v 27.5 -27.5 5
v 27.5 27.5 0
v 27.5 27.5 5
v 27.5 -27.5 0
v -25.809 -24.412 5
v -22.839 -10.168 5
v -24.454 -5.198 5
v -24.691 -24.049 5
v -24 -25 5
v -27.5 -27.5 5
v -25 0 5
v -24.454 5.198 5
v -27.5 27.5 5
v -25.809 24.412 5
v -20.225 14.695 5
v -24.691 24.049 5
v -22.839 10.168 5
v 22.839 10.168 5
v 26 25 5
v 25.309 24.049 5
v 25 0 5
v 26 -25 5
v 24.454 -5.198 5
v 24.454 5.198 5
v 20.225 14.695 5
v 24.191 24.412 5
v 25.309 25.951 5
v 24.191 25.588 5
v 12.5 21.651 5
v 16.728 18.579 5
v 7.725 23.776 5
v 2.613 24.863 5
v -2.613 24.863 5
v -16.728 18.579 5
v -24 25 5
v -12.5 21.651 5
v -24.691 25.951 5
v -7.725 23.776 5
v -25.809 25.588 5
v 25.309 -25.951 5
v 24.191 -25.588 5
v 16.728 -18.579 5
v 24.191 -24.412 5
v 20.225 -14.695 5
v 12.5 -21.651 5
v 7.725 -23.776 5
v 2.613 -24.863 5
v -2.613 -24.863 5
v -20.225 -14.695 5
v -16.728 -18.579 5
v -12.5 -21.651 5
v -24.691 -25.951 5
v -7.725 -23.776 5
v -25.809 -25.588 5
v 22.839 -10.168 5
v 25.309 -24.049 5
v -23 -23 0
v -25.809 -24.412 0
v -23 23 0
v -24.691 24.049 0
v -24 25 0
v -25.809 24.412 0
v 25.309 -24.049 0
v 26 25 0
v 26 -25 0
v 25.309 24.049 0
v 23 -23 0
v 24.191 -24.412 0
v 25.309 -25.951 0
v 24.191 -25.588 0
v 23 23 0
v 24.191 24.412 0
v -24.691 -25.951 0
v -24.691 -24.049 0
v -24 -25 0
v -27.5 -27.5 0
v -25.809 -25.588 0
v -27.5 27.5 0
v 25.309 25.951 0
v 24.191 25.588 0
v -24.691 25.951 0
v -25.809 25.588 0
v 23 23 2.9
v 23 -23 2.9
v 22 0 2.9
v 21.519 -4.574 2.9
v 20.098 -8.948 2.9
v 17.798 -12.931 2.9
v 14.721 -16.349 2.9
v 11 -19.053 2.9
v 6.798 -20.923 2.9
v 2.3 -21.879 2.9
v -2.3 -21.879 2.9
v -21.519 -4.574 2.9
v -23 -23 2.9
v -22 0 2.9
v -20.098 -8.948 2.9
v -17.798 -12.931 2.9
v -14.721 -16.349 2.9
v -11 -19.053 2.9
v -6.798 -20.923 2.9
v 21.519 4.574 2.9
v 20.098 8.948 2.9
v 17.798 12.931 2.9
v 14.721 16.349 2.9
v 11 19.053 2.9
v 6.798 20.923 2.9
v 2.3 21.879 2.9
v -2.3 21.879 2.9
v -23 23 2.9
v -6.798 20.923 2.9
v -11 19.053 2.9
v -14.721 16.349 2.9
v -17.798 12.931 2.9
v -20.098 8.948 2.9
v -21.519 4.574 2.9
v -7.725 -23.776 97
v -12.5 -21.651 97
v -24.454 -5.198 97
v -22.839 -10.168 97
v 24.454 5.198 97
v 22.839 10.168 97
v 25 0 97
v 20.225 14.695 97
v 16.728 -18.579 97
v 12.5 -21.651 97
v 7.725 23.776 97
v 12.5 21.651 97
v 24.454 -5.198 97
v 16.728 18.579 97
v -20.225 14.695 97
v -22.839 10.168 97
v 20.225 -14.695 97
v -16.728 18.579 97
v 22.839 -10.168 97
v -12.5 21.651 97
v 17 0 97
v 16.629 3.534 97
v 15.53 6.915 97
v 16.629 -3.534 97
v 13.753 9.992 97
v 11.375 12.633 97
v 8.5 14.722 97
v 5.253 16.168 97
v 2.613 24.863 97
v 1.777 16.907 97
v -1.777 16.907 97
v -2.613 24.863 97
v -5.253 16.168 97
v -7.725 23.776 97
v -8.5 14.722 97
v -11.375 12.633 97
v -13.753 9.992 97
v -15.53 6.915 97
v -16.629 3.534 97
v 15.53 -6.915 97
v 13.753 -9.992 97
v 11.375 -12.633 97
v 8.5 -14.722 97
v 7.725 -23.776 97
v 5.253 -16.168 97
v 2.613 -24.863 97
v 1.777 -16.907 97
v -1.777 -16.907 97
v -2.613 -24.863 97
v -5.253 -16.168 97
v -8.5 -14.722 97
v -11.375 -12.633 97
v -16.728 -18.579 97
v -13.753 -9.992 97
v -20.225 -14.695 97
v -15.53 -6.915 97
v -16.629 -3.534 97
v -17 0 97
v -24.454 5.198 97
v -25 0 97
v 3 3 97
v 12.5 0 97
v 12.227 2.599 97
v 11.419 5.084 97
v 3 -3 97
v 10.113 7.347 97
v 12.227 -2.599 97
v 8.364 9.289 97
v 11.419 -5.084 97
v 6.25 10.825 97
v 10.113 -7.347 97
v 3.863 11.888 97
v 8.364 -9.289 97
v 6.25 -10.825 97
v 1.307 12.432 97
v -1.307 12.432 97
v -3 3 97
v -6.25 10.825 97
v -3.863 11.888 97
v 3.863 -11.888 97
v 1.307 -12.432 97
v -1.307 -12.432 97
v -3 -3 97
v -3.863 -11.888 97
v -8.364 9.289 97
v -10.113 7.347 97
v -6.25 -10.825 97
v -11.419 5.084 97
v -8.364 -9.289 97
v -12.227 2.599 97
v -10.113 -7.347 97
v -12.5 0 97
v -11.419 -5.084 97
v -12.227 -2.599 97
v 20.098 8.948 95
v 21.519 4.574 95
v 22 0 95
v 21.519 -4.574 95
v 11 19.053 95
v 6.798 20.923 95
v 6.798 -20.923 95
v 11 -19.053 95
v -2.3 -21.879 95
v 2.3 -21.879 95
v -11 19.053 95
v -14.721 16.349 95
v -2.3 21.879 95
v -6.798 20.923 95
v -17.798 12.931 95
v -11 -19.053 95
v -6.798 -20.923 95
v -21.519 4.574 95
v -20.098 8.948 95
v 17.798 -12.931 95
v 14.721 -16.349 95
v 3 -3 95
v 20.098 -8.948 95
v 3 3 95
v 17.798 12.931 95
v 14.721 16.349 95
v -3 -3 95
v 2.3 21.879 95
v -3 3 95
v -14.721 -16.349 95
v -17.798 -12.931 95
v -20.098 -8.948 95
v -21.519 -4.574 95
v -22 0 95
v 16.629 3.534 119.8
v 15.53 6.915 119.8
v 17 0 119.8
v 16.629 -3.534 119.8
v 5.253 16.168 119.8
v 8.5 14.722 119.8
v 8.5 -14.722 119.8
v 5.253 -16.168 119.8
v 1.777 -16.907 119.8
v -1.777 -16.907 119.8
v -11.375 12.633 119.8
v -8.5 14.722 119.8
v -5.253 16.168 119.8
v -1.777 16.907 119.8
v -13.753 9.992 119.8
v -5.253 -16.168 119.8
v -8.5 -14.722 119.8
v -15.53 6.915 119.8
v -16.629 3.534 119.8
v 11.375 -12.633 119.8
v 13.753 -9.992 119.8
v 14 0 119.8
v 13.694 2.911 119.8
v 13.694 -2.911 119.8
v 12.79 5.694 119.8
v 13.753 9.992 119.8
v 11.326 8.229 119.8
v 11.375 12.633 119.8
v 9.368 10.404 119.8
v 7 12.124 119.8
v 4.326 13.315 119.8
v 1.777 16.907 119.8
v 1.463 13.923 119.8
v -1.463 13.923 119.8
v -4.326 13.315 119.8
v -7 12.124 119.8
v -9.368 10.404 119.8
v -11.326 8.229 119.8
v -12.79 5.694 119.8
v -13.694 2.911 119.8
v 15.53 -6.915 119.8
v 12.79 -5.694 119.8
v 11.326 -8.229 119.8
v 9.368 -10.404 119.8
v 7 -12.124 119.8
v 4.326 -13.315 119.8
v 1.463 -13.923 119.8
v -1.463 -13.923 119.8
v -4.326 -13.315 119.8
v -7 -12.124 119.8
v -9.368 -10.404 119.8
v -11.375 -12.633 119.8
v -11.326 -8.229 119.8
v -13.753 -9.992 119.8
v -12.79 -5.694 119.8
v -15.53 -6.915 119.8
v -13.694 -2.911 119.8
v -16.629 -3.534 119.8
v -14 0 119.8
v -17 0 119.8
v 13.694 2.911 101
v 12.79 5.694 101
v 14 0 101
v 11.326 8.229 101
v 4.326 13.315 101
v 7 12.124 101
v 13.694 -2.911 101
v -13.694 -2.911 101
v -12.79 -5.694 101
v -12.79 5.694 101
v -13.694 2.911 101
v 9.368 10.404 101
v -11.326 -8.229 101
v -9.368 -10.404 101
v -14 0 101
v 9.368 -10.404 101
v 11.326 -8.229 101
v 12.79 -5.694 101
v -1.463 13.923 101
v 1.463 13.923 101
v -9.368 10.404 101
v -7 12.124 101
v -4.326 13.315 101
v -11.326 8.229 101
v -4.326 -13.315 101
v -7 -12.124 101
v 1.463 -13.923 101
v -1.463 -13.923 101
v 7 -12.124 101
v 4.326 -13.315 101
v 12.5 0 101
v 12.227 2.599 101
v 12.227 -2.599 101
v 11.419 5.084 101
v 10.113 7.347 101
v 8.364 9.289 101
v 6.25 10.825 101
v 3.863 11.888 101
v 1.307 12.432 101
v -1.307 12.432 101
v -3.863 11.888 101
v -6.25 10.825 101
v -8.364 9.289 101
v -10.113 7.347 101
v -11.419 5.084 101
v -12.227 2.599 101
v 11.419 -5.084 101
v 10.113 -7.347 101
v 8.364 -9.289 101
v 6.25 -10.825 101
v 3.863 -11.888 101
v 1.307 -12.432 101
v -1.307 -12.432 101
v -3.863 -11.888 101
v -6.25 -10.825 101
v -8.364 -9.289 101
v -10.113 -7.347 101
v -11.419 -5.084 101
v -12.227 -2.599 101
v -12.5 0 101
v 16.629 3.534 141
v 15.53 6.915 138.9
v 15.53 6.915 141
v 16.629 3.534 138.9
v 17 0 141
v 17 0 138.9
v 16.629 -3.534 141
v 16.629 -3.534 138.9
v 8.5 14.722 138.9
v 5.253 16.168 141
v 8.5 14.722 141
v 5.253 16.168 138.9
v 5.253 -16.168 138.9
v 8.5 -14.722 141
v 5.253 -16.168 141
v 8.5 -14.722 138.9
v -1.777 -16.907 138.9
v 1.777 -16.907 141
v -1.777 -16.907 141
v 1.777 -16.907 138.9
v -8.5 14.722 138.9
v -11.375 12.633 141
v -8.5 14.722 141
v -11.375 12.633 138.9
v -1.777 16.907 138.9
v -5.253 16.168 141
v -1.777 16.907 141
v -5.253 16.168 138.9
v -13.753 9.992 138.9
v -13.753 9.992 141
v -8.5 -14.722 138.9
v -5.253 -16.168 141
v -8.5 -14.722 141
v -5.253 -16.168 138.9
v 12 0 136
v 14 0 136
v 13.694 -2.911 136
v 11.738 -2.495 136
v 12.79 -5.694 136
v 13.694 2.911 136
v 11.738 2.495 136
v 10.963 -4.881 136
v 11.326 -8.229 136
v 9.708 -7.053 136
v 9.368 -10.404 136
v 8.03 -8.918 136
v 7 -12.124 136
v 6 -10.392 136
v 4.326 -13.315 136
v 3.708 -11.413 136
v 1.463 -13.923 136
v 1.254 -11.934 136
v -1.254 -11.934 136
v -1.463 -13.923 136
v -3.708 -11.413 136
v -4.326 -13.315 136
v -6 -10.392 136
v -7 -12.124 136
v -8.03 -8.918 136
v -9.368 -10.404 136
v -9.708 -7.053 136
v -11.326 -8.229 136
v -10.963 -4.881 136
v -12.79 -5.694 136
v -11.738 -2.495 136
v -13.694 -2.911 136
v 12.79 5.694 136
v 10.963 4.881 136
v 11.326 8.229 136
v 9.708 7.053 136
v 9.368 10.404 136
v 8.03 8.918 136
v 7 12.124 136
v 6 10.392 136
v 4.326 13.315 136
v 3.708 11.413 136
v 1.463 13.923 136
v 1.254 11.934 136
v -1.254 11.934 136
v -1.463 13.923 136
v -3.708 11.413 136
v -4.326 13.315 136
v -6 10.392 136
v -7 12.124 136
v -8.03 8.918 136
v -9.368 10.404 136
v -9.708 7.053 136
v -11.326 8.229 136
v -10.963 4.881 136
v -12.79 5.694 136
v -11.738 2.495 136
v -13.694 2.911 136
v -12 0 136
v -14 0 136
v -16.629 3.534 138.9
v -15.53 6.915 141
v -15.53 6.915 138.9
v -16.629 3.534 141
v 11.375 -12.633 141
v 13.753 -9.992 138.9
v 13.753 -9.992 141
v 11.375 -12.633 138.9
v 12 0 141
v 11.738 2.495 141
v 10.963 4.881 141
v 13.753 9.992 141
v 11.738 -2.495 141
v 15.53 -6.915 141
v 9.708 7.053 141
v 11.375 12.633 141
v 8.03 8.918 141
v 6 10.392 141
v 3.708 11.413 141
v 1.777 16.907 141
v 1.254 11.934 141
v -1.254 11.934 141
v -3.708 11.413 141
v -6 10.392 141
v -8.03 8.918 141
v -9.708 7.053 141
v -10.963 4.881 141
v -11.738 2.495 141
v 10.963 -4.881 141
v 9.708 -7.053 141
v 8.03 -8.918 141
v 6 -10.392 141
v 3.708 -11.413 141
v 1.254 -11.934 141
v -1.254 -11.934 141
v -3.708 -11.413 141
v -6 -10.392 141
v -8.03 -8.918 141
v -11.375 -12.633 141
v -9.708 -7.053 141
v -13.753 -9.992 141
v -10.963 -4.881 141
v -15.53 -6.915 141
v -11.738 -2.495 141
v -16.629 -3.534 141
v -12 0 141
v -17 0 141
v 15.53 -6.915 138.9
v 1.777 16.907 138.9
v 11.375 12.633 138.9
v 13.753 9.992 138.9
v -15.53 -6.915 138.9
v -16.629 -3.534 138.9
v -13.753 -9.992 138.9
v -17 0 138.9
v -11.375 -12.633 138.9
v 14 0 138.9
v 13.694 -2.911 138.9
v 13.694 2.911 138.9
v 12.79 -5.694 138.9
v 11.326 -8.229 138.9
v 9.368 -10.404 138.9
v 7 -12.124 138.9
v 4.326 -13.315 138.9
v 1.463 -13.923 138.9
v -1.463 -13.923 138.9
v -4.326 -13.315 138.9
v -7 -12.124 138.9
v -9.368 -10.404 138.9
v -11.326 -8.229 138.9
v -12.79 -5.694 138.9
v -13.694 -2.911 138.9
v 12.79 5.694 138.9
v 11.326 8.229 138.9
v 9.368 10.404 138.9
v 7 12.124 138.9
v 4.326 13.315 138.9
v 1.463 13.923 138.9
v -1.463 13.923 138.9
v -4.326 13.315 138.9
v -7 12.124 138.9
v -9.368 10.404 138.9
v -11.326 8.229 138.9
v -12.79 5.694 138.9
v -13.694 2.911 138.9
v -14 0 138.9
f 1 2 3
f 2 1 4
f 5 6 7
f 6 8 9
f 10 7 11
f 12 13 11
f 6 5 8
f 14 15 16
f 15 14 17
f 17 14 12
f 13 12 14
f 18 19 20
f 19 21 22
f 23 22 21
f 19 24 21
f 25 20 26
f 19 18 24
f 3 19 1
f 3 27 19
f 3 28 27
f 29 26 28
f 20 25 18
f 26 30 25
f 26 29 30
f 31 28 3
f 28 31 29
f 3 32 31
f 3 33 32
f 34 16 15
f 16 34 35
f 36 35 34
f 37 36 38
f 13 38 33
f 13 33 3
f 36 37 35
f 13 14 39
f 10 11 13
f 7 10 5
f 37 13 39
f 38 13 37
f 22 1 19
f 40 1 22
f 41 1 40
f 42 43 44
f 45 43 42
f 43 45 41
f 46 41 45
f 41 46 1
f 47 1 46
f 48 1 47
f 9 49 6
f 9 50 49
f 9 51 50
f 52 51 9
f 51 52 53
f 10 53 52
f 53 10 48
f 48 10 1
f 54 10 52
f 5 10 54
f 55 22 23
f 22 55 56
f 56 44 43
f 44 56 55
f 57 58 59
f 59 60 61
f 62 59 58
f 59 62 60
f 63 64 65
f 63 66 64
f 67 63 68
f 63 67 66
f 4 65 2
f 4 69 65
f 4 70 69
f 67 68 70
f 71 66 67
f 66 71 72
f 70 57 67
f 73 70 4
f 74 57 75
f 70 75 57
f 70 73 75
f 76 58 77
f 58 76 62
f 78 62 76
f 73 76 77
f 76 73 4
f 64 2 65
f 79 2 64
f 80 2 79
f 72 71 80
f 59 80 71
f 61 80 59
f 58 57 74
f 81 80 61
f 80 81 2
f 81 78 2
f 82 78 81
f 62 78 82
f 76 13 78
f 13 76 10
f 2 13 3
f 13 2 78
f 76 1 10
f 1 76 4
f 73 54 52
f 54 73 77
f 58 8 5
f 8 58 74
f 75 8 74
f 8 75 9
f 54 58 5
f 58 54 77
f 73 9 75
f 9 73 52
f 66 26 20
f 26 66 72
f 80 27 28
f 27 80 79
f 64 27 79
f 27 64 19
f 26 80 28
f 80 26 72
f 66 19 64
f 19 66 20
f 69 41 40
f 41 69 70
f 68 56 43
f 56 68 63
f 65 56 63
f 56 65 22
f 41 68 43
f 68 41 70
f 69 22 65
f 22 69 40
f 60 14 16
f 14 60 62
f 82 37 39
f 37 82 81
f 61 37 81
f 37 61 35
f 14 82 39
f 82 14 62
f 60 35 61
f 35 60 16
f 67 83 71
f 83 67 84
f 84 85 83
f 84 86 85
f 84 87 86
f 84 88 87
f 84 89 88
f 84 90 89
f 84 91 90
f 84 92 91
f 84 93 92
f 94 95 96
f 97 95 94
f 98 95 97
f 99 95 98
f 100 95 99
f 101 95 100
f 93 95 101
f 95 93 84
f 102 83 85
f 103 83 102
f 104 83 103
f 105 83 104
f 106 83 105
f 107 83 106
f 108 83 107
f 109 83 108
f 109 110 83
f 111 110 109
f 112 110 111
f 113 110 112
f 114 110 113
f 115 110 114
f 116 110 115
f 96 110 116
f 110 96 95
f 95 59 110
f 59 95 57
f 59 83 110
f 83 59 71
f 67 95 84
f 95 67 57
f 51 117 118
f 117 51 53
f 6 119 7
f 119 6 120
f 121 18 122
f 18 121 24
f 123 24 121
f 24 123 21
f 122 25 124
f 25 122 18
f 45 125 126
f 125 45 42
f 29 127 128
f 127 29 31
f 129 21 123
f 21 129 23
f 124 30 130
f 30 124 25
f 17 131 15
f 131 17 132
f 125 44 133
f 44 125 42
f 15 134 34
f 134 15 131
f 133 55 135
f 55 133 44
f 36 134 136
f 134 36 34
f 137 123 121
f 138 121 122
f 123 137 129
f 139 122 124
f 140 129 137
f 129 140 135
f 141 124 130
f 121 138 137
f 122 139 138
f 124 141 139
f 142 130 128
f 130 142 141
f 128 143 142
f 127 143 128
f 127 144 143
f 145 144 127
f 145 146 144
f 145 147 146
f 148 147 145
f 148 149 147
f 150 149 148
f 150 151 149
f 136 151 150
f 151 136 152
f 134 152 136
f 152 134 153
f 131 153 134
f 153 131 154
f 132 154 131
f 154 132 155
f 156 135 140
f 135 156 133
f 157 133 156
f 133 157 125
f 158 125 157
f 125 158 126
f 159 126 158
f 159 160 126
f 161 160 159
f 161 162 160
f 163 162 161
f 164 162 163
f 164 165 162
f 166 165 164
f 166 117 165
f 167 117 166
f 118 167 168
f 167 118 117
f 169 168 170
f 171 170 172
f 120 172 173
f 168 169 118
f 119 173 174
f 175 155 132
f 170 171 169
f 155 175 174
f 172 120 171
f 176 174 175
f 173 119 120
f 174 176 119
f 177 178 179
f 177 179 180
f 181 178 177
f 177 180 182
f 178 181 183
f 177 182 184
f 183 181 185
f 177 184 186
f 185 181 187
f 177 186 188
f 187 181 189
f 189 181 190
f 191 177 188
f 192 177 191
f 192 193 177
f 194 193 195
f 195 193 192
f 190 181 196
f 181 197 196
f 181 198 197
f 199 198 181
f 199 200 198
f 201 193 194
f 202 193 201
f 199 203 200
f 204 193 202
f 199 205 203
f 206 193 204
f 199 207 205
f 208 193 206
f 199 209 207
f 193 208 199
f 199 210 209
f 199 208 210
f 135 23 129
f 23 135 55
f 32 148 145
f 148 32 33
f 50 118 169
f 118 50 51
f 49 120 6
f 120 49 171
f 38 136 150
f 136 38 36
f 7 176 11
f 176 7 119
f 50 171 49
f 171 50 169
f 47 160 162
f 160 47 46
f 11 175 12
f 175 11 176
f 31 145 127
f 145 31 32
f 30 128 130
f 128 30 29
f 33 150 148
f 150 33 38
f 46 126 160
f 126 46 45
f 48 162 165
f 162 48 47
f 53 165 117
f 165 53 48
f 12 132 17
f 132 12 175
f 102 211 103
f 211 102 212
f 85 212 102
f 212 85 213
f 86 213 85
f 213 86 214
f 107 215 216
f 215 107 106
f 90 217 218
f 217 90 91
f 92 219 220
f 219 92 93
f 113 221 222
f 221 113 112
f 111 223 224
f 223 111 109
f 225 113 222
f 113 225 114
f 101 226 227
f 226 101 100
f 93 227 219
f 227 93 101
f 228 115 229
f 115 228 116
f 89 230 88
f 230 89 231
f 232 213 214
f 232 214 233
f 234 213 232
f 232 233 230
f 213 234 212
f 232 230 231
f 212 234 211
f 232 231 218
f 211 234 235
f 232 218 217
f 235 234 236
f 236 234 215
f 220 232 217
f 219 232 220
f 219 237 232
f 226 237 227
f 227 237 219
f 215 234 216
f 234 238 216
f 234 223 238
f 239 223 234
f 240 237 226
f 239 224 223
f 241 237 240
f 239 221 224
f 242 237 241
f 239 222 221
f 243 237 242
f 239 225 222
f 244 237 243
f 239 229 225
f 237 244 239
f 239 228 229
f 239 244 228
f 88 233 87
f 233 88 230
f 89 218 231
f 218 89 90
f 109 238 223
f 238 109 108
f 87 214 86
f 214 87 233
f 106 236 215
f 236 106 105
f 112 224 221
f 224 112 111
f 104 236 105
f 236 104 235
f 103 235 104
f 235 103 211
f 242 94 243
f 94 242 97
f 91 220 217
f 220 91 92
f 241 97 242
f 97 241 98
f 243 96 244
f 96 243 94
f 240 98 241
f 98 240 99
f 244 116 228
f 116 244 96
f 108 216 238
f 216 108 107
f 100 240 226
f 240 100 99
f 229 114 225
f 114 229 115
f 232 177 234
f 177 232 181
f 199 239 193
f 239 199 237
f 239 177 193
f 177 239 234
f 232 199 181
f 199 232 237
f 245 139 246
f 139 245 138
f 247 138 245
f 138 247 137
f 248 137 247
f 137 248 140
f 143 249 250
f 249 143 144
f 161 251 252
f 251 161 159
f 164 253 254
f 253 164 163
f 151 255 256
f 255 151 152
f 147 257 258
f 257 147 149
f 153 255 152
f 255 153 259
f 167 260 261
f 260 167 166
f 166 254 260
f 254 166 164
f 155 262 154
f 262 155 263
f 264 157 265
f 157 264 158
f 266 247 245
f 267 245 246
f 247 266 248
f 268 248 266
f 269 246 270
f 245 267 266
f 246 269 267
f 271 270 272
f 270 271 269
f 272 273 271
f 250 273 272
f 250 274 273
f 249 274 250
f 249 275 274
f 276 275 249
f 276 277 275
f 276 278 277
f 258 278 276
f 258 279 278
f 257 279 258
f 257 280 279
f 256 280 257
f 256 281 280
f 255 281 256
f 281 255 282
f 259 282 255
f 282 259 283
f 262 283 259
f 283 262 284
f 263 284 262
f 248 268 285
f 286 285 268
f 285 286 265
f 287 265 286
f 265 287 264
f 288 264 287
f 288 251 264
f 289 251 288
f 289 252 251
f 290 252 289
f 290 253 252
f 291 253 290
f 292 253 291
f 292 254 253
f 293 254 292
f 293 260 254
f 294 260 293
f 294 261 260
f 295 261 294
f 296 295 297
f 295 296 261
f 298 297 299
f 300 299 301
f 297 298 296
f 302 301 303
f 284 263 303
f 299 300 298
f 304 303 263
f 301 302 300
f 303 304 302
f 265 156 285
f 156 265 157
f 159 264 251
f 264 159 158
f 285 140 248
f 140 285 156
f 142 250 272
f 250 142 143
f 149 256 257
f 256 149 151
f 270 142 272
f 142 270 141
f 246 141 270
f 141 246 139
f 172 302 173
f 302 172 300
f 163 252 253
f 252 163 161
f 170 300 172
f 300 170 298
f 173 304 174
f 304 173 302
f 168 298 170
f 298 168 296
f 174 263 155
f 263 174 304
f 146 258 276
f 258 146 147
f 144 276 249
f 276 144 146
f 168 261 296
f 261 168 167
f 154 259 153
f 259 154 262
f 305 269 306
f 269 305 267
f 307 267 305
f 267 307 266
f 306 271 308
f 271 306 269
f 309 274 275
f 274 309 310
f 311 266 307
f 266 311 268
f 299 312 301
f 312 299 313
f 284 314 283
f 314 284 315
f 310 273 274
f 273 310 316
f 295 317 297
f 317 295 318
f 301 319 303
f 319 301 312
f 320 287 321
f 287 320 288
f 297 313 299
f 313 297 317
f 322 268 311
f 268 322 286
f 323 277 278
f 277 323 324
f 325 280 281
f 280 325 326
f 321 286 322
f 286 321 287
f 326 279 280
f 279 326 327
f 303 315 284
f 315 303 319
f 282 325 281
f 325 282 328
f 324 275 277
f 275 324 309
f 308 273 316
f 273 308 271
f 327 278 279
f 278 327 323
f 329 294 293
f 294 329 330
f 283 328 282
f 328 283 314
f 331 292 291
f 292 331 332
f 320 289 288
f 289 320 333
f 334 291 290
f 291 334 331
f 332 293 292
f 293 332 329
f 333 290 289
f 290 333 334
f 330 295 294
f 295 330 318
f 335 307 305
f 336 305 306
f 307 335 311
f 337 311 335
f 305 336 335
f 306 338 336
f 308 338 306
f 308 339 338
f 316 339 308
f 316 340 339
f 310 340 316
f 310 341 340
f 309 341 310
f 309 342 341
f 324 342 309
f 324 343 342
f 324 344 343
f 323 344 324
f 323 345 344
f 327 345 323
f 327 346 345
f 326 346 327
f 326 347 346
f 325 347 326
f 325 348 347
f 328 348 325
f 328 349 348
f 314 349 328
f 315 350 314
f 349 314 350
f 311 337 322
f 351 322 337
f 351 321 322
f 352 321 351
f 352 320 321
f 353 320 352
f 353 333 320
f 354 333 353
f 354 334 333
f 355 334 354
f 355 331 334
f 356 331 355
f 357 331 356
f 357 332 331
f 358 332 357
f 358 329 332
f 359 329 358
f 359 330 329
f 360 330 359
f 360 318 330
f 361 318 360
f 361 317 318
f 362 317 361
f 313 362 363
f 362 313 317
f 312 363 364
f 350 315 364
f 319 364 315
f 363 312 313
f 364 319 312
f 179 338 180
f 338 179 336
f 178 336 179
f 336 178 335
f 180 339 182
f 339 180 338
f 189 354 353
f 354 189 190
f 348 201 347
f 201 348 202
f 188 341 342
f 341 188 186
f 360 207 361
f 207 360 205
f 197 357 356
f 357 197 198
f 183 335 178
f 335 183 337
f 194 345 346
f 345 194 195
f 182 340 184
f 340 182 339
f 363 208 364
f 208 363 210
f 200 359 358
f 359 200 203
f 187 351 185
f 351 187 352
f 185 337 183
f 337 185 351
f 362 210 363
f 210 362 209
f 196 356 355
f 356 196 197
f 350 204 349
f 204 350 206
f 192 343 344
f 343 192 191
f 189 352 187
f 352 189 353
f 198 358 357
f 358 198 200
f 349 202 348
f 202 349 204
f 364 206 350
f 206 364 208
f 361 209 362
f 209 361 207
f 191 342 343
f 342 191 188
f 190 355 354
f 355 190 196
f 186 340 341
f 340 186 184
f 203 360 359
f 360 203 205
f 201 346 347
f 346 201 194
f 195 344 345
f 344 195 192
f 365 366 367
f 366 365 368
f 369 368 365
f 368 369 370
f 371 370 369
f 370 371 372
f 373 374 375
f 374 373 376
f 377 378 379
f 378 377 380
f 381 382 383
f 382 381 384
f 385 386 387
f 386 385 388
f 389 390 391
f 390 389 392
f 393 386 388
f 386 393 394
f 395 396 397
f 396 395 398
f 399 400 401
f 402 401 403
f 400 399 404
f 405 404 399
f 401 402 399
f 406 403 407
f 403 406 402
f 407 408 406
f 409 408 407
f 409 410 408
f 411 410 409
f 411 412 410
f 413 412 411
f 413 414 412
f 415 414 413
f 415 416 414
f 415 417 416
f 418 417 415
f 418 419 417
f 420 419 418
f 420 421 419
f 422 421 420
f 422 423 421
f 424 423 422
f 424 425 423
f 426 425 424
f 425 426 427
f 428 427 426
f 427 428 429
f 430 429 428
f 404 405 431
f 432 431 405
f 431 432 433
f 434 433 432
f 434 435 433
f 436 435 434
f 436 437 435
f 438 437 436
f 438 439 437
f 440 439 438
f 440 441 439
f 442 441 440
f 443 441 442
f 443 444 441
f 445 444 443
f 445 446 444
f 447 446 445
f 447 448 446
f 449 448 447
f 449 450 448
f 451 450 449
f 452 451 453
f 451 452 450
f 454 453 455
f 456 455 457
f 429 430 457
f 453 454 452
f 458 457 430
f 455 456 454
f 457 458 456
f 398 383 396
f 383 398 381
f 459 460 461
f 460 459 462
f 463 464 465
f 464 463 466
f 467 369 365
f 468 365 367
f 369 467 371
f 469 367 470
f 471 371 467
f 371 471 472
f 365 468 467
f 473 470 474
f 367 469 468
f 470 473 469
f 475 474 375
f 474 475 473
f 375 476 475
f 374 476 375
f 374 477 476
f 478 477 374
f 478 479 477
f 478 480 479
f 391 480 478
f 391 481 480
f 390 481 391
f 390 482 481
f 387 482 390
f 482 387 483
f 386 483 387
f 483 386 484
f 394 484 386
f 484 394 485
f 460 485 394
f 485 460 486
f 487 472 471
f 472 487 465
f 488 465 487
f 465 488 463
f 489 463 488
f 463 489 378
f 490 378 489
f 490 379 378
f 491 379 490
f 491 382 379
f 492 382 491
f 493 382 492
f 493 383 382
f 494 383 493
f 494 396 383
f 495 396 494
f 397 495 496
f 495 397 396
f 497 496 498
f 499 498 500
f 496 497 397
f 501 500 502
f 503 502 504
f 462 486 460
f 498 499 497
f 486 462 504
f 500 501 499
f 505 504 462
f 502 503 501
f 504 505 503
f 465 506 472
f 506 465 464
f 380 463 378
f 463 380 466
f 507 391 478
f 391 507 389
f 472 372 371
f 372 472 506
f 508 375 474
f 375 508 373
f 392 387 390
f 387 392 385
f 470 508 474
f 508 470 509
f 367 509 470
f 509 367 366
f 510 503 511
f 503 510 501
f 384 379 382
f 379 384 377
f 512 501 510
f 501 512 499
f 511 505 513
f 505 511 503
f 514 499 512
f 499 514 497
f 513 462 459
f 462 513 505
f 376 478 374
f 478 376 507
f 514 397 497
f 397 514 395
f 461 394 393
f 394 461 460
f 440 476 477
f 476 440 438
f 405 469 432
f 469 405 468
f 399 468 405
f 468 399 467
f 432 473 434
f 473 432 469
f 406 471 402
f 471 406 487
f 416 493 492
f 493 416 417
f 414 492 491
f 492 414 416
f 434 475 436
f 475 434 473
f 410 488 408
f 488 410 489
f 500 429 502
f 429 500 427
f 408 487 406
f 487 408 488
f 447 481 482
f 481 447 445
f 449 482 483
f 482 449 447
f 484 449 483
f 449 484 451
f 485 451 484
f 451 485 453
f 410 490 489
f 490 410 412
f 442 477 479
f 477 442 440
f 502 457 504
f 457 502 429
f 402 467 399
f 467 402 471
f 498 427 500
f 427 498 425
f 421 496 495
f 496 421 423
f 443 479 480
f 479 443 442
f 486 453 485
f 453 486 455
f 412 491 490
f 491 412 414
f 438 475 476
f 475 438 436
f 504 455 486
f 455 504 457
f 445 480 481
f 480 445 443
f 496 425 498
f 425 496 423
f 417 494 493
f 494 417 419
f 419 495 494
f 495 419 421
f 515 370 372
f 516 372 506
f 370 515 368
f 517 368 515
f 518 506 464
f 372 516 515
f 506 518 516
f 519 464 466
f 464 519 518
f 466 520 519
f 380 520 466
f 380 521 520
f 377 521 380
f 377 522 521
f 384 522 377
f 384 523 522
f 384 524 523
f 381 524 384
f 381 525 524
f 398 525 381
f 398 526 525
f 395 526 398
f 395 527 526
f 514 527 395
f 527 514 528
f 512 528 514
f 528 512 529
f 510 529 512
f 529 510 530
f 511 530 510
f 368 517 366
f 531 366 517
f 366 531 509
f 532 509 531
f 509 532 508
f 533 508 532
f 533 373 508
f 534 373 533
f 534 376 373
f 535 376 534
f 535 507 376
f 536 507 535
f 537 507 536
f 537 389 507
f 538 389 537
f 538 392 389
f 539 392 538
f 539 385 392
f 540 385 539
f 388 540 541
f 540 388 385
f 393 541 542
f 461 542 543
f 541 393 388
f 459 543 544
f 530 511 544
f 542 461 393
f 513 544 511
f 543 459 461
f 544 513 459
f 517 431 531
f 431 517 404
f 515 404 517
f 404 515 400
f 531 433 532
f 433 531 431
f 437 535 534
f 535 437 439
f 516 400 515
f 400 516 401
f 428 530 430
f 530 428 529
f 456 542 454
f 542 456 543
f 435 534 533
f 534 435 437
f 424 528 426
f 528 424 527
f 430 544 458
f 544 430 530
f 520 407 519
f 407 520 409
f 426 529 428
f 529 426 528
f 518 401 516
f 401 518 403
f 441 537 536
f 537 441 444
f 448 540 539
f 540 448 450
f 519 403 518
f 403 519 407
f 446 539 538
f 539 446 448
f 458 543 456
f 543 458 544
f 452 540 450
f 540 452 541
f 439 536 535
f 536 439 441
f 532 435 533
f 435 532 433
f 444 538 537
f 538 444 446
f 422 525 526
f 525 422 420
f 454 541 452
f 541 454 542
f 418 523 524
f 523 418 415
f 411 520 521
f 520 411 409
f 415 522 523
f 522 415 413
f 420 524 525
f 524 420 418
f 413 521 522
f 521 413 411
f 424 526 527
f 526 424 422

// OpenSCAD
// file: adqLight.scad
include <./aux/creaBase.scad>


frenteH = 19;
frenteCeja = 4.5;
frenteCejaH = 3;

squareW = 6;


//adqSquAndTop();



module adqSquAndTop(){

	adqAndSquare();

	translate([0,0,40])
	frenteTapa();
}






module frenteTapa(){

	difference(){
		//Pared
		difference(){
			cylinder(r=17,5);
			translate([0,0,-0.1])
			cylinder(r=12,8);
		}
		//Ceja
		translate([0,0,-0.1])
		difference(){
			cylinder(r=18,3);
			translate([0,0,-0.1])
			cylinder(r=14,3.1);
		}
	}

}







module adqAndSquare(){

	difference(){
		translate([0,0,4.8])
		cylinder(r=17,frenteH);
		cylinder(r=14,frenteH*2);
	}

	//Rosca lente
	difference(){
		cylinder(r=17,5);
		//Lente rosca
		translate([0,0,-0.1])
		cylinder(r=12.5,7);
	}
}
// file: aux/creaBase.scad
W = 55;
H = 55;

//createBase( 7 );

module createBase( h ){
	difference(){
		translate([-W/2,-H/2,0])
		cube([W,H,h]);
		//Quita tornillos
		translate([-(W/2)+2.5,-(H/2)+2.5,-0.1])
		cylinder( r=1, h*2+0.2 );
		translate([(W/2)-2.5,(H/2)-2.5,-0.1])
		cylinder( r=1, h*2+0.2 );
		translate([+(W/2)-2.5,-(H/2)+2.5,-0.1])
		cylinder( r=1, h*2+0.2 );
		translate([-(W/2)+2.5,(H/2)-2.5,-0.1])
		cylinder( r=1, h*2+0.2 );
	}
}
// main file
include <./aux/creaBase.scad>
include <adqLight.scad>

squareH = 5;
squareW = 6;
frenteCeja = 4.5;
frenteCejaH = 3;
tuboH = 93;
tuboRadio = 25;

creaTubo();

module creaTubo(){
	difference(){
		createBaseYTubo();
		cylinder(r=tuboRadio-3,tuboH+2);

		translate([-squareW/2,-squareW/2,tuboH])
		cube(squareW,squareW,squareH);	
	}

	translate([0,0,96])
	adqSquAndTop();
}










module createBaseYTubo(){
	creaBaseHembra();

	//Hembra del cilindro
	translate([0,0,4])
	cylinder(r=tuboRadio,	tuboH);
}



module creaBaseHembra(){
	difference(){
		//Tornillos
		createBase( squareH );

		//Ceja
		translate([-(W/2)+frenteCeja,-(H/2)+frenteCeja,-0.1])
		cube([W-9,H-9,3]);

	}
}
